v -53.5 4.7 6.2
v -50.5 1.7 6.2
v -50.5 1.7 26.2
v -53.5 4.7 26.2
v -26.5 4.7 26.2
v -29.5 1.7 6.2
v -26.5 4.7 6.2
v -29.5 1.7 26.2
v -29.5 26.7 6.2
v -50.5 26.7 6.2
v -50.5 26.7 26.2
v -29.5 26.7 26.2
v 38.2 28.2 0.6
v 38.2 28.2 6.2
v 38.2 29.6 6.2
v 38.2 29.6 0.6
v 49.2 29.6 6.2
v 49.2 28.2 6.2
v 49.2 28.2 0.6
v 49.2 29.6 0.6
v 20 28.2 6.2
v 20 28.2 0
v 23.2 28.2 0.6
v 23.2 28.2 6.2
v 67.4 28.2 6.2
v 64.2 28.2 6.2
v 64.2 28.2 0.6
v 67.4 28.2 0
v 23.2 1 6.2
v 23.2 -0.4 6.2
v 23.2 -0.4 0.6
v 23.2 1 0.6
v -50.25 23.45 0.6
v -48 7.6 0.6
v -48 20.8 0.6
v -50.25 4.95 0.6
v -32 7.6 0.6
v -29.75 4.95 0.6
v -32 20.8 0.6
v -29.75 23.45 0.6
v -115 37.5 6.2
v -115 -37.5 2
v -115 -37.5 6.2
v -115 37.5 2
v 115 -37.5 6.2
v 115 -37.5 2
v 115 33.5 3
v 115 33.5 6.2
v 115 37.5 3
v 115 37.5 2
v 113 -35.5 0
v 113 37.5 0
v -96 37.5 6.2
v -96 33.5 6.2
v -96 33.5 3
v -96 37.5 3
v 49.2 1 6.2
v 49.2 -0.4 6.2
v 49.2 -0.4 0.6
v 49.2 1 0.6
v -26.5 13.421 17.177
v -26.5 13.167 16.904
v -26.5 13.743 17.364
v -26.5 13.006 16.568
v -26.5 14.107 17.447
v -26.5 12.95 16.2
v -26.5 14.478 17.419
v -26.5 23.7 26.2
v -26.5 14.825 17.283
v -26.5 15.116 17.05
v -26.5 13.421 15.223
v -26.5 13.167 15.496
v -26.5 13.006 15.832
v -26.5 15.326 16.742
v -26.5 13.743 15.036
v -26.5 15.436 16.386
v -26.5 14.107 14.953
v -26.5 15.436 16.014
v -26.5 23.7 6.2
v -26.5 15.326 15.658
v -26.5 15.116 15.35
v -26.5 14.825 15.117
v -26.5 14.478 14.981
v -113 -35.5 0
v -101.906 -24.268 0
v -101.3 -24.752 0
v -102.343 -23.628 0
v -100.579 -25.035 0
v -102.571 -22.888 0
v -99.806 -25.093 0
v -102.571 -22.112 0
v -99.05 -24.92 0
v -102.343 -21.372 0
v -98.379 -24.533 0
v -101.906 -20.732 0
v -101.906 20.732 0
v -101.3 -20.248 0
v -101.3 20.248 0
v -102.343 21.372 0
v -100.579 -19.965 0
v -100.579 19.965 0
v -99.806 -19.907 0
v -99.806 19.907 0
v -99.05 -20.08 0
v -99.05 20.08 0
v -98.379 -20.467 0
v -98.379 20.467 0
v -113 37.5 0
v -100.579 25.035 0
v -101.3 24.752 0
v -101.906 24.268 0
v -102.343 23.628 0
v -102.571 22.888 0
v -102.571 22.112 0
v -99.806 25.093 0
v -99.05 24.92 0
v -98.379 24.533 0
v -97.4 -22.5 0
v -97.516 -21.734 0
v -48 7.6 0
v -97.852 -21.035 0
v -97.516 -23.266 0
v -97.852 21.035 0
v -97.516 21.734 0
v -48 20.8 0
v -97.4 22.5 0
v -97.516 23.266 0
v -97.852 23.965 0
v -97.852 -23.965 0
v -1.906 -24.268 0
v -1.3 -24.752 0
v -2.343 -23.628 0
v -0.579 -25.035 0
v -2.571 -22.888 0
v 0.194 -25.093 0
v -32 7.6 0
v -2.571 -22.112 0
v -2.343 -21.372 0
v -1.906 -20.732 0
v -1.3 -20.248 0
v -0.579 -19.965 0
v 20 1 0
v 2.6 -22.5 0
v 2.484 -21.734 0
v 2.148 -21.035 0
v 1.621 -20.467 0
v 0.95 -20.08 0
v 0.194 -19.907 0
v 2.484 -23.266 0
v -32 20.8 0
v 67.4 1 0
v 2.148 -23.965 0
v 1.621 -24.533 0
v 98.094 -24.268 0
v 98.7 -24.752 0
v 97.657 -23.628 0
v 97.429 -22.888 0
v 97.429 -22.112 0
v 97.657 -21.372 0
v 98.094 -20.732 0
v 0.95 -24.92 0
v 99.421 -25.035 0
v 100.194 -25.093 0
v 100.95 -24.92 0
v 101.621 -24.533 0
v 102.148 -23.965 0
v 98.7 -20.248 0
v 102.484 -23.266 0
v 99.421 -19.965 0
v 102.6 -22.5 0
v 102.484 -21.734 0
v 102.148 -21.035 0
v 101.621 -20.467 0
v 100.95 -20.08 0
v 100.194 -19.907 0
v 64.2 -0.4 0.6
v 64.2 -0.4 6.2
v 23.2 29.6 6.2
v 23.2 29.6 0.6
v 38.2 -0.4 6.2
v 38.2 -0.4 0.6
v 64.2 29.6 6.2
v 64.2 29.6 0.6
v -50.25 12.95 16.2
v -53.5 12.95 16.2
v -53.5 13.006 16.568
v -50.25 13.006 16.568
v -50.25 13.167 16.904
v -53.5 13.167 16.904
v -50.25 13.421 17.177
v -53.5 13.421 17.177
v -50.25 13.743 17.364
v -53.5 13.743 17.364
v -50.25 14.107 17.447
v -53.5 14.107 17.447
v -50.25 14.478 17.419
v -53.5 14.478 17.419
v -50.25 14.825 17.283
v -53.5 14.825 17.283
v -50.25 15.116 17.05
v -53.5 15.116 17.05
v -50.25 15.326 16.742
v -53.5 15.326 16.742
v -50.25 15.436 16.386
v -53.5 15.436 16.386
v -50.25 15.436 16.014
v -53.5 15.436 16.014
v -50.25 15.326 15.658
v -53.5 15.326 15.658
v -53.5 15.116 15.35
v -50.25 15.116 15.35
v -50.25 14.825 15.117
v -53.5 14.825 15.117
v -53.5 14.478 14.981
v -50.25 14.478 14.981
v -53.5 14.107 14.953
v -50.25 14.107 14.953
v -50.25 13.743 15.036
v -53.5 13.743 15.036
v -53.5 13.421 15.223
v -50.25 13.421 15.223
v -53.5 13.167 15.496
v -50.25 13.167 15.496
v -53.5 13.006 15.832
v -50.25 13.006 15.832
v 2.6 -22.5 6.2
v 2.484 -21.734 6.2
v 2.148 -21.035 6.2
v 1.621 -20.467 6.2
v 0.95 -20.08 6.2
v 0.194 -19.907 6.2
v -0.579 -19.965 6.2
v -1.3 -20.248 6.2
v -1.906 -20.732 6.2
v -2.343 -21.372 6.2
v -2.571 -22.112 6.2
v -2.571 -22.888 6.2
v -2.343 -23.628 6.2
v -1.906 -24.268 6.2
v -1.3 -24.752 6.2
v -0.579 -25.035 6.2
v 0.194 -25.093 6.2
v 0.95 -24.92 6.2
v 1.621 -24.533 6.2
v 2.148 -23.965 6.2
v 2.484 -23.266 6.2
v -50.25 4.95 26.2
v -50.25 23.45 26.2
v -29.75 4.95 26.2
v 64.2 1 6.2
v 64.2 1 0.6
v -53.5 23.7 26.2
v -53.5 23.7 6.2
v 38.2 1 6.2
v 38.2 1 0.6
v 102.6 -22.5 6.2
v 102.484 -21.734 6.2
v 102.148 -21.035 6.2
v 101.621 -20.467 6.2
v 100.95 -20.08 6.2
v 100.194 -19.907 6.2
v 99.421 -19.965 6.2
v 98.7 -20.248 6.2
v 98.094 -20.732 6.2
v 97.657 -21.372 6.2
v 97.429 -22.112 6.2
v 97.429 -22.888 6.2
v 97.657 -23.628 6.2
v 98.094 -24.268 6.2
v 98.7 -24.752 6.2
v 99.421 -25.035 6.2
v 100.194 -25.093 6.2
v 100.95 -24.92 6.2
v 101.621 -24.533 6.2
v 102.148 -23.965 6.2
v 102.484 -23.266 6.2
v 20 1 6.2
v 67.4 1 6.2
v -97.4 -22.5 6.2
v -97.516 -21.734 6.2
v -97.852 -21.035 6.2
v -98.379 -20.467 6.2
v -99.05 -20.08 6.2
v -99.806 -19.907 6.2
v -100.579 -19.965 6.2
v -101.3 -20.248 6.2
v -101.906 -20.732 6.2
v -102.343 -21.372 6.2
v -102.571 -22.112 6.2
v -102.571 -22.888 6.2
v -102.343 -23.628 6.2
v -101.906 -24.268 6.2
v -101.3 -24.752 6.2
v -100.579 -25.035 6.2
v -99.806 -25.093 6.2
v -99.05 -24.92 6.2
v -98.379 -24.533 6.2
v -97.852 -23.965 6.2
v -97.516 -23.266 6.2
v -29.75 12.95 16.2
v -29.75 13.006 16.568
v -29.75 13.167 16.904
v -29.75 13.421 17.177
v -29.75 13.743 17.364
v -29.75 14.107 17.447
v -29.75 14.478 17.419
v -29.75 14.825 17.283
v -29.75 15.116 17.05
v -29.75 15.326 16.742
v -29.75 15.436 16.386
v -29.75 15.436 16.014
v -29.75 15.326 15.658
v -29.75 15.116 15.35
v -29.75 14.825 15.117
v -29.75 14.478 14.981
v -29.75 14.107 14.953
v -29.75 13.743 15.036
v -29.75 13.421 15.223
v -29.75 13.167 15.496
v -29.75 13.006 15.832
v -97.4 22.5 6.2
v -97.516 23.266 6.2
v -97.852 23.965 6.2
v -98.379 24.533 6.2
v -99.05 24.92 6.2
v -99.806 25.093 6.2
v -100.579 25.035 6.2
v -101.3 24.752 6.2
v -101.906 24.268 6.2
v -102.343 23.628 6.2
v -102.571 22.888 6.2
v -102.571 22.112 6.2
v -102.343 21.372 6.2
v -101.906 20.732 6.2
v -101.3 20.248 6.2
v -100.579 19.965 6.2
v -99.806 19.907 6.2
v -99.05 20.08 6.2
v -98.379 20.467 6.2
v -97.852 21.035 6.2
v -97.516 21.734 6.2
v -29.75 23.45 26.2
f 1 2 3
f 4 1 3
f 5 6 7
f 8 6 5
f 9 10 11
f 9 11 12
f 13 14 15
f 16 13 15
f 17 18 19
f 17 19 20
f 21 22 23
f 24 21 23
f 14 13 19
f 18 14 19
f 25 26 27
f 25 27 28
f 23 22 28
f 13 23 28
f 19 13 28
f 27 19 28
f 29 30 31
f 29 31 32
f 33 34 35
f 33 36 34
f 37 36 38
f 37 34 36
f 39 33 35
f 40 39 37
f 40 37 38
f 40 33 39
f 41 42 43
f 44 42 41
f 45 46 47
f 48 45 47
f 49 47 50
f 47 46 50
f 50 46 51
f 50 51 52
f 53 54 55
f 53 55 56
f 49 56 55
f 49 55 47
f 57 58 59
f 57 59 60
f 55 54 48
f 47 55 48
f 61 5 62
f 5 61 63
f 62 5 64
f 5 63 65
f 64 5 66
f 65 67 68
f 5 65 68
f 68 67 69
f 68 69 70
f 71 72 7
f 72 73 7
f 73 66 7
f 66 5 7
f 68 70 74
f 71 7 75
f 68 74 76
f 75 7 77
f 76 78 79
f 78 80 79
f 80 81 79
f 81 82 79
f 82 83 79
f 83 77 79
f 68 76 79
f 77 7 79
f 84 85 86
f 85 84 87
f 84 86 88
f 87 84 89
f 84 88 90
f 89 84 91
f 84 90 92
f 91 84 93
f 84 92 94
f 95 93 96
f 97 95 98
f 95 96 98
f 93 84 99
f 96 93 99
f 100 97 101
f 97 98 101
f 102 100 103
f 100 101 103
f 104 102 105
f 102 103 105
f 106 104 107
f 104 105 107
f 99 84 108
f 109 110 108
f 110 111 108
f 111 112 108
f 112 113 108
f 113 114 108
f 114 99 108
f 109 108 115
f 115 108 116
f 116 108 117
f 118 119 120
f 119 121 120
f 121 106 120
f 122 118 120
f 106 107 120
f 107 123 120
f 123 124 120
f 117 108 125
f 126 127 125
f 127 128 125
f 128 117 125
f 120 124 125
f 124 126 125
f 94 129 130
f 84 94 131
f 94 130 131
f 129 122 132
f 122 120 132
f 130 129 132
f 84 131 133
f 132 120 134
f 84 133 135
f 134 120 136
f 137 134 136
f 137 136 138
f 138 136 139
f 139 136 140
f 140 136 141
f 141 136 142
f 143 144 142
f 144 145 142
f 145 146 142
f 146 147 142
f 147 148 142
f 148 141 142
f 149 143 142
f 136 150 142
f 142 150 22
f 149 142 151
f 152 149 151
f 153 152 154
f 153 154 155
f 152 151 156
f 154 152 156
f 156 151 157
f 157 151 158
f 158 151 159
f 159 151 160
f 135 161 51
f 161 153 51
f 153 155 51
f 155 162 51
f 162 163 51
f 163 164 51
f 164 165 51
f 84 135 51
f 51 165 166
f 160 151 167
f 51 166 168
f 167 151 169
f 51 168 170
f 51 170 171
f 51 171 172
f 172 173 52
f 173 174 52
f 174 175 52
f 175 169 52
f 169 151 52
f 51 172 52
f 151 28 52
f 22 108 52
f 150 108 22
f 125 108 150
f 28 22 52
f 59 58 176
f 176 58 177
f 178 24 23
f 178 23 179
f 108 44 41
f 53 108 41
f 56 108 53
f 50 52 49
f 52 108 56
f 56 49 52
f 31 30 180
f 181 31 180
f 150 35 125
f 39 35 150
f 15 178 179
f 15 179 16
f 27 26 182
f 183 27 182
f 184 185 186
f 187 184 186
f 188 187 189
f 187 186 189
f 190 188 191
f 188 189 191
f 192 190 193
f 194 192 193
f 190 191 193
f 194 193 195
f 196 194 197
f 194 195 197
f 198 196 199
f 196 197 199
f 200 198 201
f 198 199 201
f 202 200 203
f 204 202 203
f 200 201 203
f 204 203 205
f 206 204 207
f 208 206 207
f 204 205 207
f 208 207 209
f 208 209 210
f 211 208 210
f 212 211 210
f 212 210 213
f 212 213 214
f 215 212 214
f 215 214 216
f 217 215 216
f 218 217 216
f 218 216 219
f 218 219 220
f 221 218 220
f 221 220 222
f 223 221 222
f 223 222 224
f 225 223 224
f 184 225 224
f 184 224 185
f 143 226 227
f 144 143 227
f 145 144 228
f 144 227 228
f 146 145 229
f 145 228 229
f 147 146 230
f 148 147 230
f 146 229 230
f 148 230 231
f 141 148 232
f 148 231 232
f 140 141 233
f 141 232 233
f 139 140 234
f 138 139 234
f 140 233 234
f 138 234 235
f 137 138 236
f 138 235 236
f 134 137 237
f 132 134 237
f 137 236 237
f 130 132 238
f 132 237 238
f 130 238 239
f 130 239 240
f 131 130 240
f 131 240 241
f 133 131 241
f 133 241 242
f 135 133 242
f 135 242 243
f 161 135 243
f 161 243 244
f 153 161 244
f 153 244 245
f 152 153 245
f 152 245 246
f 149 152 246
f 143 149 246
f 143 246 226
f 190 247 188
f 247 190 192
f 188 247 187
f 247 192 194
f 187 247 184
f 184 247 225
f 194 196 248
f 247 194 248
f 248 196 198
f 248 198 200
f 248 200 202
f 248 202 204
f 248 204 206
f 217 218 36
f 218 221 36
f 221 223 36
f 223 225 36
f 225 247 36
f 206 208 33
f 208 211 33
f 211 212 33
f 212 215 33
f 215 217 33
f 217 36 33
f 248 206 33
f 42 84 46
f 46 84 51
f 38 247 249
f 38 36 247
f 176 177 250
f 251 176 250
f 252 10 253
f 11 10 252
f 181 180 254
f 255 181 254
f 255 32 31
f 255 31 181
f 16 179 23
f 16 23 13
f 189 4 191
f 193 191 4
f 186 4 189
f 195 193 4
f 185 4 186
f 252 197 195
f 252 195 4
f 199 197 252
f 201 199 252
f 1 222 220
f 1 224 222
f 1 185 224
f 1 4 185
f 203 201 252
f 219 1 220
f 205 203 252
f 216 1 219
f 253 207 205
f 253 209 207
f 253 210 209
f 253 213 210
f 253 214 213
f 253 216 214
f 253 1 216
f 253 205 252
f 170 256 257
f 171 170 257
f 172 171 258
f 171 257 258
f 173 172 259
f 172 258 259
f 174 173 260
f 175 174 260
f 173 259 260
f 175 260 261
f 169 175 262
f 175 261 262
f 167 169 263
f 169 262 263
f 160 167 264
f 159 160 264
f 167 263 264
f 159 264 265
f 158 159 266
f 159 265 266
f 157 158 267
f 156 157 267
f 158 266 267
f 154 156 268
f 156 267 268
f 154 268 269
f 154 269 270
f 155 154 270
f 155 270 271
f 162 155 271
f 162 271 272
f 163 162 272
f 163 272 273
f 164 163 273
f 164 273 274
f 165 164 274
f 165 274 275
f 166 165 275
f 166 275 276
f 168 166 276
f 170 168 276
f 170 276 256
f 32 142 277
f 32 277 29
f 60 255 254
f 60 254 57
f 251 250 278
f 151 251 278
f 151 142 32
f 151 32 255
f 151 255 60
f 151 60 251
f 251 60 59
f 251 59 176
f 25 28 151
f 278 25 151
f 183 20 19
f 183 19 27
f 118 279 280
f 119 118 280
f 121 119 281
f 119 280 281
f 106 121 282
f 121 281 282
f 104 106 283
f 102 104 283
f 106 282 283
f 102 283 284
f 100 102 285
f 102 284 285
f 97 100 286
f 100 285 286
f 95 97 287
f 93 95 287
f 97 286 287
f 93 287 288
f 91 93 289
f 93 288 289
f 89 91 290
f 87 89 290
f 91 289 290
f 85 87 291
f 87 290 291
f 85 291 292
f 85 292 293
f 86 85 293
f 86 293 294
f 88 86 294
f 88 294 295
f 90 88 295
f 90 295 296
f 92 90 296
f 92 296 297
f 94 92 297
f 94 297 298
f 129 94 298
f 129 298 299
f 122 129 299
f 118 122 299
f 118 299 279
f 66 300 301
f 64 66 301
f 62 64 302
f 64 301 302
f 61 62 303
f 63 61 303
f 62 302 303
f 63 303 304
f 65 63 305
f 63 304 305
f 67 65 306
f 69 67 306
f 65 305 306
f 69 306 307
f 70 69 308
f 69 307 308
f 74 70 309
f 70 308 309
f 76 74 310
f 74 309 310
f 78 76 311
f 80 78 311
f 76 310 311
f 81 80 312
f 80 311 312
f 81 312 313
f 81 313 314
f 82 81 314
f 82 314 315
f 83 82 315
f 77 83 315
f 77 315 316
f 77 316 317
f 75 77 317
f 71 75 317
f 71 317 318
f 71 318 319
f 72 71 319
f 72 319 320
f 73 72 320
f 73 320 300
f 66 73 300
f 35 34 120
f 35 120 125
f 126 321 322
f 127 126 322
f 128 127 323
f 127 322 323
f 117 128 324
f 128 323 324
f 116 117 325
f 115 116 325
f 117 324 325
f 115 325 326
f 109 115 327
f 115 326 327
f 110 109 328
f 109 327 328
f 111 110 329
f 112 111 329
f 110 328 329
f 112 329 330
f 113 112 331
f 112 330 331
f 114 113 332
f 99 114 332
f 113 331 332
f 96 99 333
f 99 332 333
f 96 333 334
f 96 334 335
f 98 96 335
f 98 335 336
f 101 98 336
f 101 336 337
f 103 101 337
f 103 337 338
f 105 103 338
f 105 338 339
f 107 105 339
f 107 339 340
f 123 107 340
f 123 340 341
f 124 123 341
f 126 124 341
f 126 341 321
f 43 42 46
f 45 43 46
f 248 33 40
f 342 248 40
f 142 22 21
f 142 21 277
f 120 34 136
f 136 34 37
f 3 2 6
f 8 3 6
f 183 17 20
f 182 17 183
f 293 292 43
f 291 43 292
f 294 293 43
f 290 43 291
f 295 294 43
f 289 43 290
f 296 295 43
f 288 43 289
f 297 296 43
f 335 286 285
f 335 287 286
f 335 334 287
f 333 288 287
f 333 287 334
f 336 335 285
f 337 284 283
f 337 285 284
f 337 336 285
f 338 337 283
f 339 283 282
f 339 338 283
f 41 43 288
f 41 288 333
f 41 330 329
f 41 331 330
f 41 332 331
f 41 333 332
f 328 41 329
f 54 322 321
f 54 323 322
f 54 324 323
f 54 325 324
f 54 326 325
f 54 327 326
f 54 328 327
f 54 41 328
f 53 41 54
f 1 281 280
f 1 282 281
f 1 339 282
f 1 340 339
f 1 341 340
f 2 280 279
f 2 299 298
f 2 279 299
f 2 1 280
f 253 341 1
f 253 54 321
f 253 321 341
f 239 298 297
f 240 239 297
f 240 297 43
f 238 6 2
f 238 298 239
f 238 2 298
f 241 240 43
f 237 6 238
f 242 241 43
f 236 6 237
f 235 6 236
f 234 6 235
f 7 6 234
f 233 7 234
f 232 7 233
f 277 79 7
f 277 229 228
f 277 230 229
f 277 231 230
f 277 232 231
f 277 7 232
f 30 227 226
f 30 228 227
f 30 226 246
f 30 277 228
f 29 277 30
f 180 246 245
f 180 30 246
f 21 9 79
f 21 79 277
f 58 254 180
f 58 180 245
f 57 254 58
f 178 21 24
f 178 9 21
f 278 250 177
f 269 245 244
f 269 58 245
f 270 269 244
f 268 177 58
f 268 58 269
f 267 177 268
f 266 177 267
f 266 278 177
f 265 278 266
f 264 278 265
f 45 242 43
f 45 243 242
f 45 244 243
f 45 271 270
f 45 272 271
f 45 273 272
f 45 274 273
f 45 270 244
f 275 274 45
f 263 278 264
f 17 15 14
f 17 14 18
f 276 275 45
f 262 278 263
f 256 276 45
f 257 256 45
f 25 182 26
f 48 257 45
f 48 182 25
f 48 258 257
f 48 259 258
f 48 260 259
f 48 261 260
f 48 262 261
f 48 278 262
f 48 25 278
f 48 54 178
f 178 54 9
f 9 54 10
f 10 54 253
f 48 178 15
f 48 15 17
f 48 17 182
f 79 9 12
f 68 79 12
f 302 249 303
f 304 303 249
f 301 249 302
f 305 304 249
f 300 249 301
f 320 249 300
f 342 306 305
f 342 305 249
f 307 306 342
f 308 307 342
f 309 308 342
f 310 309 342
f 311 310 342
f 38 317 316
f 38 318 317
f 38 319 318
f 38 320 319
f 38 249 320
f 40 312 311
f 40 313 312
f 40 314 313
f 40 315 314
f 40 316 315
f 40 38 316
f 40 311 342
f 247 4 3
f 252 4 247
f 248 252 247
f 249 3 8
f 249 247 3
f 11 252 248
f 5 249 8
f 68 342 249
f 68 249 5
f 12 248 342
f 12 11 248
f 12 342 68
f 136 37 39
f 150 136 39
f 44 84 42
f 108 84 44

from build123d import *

# Parameters (mm, degrees)
SKETCH_W        = 230
SKETCH_H        = 75
PAD_DEPTH       = 6.2
SKETCH001_W     = 211
SKETCH001_H     = 4
POCKET_DEPTH    = 3.2
CHAMFER_SIZE    = 2
SKETCH002_R     = 2.6
POCKET001_DEPTH = 10
SKETCH003_W     = 47.4
SKETCH003_H     = 27.2
POCKET002_DEPTH = 7
SKETCH004_W     = 15
SKETCH004_H     = 30
POCKET003_DEPTH = 5.6
SKETCH005_W     = 16
SKETCH005_H     = 13.2
POCKET004_DEPTH = 8
SKETCH006_W     = 20.5
SKETCH006_H     = 18.5
POCKET005_DEPTH = 5.6
SKETCH007_W     = 27
SKETCH007_H     = 25
SKETCH007_W_2   = 20.5
SKETCH007_H_2   = 18.5
PAD001_DEPTH    = 20
CHAMFER001_SIZE = 3
SKETCH008_R     = 1.25
POCKET006_DEPTH = 30


with BuildPart() as part:
    # Sketch → Pad (new body)
    with BuildSketch(Plane.XY):
        Rectangle(SKETCH_W, SKETCH_H)
    extrude(amount=PAD_DEPTH)

    # Sketch001 (on Face6 of Pad) → Pocket (cut)
    with BuildSketch(Plane.XY.offset(6.2)):
        with Locations((9.5, 35.5)):
            Rectangle(SKETCH001_W, SKETCH001_H)
    extrude(amount=-POCKET_DEPTH, mode=Mode.SUBTRACT)

    # Chamfer
    chamfer_edges = [part.edges().sort_by_distance(p)[0] for p in [
        (-115, 0, 0),
        (0, -37.5, 0),
        (115, 0, 0),
    ]]
    chamfer(chamfer_edges, length=CHAMFER_SIZE)

    # Sketch002 (on Face4 of Chamfer) → Pocket001 (cut)
    with BuildSketch(Plane.XY.offset(6.2)):
        with Locations((-100, -22.5)):
            Circle(SKETCH002_R)
        with Locations((0, -22.5)):
            Circle(SKETCH002_R)
        with Locations((100, -22.5)):
            Circle(SKETCH002_R)
        with Locations((-100, 22.5)):
            Circle(SKETCH002_R)
    extrude(amount=-POCKET001_DEPTH, mode=Mode.SUBTRACT)

    # Sketch003 (on Face8 of Pocket001) → Pocket002 (cut)
    with BuildSketch(Plane(origin=(0, 0, 0), x_dir=(1, 0, 0), z_dir=(0, 0, -1))):
        with Locations((43.7, -14.6)):
            Rectangle(SKETCH003_W, SKETCH003_H)
    extrude(amount=-POCKET002_DEPTH, mode=Mode.SUBTRACT)

    # Sketch004 (on Face4 of Pocket002) → Pocket003 (cut)
    with BuildSketch(Plane.XY.offset(6.2)):
        with Locations((30.7, 14.6)):
            Rectangle(SKETCH004_W, SKETCH004_H)
        with Locations((56.7, 14.6)):
            Rectangle(SKETCH004_W, SKETCH004_H)
    extrude(amount=-POCKET003_DEPTH, mode=Mode.SUBTRACT)

    # Sketch005 (on Face4 of Pocket003) → Pocket004 (cut)
    with BuildSketch(Plane.XY.offset(6.2)):
        with Locations((-40, 14.2)):
            Rectangle(SKETCH005_W, SKETCH005_H)
    extrude(amount=-POCKET004_DEPTH, mode=Mode.SUBTRACT)

    # Sketch006 (on Face4 of Pocket004) → Pocket005 (cut)
    with BuildSketch(Plane.XY.offset(6.2)):
        with Locations((-40, 14.2)):
            Rectangle(SKETCH006_W, SKETCH006_H)
    extrude(amount=-POCKET005_DEPTH, mode=Mode.SUBTRACT)

    # Sketch007 (on Face4 of Pocket005) → Pad001 (join)
    with BuildSketch(Plane.XY.offset(6.2)):
        with Locations((-40, 14.2)):
            Rectangle(SKETCH007_W, SKETCH007_H)
        with Locations((-40, 14.2)):
            Rectangle(SKETCH007_W_2, SKETCH007_H_2, mode=Mode.SUBTRACT)
    extrude(amount=PAD001_DEPTH)

    # Chamfer001
    chamfer001_edges = [part.edges().sort_by_distance(p)[0] for p in [
        (-53.5, 1.7, 16.2),
        (-26.5, 1.7, 16.2),
        (-53.5, 26.7, 16.2),
        (-26.5, 26.7, 16.2),
    ]]
    chamfer(chamfer001_edges, length=CHAMFER001_SIZE)

    # Sketch008 (on Face5 of Chamfer001) → Pocket006 (cut)
    with BuildSketch(Plane(origin=(-53.5, 0, 0), x_dir=(0, -1, 0), z_dir=(-1, 0, 0))):
        with Locations((-14.2, 16.2)):
            Circle(SKETCH008_R)
    extrude(amount=-POCKET006_DEPTH, mode=Mode.SUBTRACT)


solid = part.part
